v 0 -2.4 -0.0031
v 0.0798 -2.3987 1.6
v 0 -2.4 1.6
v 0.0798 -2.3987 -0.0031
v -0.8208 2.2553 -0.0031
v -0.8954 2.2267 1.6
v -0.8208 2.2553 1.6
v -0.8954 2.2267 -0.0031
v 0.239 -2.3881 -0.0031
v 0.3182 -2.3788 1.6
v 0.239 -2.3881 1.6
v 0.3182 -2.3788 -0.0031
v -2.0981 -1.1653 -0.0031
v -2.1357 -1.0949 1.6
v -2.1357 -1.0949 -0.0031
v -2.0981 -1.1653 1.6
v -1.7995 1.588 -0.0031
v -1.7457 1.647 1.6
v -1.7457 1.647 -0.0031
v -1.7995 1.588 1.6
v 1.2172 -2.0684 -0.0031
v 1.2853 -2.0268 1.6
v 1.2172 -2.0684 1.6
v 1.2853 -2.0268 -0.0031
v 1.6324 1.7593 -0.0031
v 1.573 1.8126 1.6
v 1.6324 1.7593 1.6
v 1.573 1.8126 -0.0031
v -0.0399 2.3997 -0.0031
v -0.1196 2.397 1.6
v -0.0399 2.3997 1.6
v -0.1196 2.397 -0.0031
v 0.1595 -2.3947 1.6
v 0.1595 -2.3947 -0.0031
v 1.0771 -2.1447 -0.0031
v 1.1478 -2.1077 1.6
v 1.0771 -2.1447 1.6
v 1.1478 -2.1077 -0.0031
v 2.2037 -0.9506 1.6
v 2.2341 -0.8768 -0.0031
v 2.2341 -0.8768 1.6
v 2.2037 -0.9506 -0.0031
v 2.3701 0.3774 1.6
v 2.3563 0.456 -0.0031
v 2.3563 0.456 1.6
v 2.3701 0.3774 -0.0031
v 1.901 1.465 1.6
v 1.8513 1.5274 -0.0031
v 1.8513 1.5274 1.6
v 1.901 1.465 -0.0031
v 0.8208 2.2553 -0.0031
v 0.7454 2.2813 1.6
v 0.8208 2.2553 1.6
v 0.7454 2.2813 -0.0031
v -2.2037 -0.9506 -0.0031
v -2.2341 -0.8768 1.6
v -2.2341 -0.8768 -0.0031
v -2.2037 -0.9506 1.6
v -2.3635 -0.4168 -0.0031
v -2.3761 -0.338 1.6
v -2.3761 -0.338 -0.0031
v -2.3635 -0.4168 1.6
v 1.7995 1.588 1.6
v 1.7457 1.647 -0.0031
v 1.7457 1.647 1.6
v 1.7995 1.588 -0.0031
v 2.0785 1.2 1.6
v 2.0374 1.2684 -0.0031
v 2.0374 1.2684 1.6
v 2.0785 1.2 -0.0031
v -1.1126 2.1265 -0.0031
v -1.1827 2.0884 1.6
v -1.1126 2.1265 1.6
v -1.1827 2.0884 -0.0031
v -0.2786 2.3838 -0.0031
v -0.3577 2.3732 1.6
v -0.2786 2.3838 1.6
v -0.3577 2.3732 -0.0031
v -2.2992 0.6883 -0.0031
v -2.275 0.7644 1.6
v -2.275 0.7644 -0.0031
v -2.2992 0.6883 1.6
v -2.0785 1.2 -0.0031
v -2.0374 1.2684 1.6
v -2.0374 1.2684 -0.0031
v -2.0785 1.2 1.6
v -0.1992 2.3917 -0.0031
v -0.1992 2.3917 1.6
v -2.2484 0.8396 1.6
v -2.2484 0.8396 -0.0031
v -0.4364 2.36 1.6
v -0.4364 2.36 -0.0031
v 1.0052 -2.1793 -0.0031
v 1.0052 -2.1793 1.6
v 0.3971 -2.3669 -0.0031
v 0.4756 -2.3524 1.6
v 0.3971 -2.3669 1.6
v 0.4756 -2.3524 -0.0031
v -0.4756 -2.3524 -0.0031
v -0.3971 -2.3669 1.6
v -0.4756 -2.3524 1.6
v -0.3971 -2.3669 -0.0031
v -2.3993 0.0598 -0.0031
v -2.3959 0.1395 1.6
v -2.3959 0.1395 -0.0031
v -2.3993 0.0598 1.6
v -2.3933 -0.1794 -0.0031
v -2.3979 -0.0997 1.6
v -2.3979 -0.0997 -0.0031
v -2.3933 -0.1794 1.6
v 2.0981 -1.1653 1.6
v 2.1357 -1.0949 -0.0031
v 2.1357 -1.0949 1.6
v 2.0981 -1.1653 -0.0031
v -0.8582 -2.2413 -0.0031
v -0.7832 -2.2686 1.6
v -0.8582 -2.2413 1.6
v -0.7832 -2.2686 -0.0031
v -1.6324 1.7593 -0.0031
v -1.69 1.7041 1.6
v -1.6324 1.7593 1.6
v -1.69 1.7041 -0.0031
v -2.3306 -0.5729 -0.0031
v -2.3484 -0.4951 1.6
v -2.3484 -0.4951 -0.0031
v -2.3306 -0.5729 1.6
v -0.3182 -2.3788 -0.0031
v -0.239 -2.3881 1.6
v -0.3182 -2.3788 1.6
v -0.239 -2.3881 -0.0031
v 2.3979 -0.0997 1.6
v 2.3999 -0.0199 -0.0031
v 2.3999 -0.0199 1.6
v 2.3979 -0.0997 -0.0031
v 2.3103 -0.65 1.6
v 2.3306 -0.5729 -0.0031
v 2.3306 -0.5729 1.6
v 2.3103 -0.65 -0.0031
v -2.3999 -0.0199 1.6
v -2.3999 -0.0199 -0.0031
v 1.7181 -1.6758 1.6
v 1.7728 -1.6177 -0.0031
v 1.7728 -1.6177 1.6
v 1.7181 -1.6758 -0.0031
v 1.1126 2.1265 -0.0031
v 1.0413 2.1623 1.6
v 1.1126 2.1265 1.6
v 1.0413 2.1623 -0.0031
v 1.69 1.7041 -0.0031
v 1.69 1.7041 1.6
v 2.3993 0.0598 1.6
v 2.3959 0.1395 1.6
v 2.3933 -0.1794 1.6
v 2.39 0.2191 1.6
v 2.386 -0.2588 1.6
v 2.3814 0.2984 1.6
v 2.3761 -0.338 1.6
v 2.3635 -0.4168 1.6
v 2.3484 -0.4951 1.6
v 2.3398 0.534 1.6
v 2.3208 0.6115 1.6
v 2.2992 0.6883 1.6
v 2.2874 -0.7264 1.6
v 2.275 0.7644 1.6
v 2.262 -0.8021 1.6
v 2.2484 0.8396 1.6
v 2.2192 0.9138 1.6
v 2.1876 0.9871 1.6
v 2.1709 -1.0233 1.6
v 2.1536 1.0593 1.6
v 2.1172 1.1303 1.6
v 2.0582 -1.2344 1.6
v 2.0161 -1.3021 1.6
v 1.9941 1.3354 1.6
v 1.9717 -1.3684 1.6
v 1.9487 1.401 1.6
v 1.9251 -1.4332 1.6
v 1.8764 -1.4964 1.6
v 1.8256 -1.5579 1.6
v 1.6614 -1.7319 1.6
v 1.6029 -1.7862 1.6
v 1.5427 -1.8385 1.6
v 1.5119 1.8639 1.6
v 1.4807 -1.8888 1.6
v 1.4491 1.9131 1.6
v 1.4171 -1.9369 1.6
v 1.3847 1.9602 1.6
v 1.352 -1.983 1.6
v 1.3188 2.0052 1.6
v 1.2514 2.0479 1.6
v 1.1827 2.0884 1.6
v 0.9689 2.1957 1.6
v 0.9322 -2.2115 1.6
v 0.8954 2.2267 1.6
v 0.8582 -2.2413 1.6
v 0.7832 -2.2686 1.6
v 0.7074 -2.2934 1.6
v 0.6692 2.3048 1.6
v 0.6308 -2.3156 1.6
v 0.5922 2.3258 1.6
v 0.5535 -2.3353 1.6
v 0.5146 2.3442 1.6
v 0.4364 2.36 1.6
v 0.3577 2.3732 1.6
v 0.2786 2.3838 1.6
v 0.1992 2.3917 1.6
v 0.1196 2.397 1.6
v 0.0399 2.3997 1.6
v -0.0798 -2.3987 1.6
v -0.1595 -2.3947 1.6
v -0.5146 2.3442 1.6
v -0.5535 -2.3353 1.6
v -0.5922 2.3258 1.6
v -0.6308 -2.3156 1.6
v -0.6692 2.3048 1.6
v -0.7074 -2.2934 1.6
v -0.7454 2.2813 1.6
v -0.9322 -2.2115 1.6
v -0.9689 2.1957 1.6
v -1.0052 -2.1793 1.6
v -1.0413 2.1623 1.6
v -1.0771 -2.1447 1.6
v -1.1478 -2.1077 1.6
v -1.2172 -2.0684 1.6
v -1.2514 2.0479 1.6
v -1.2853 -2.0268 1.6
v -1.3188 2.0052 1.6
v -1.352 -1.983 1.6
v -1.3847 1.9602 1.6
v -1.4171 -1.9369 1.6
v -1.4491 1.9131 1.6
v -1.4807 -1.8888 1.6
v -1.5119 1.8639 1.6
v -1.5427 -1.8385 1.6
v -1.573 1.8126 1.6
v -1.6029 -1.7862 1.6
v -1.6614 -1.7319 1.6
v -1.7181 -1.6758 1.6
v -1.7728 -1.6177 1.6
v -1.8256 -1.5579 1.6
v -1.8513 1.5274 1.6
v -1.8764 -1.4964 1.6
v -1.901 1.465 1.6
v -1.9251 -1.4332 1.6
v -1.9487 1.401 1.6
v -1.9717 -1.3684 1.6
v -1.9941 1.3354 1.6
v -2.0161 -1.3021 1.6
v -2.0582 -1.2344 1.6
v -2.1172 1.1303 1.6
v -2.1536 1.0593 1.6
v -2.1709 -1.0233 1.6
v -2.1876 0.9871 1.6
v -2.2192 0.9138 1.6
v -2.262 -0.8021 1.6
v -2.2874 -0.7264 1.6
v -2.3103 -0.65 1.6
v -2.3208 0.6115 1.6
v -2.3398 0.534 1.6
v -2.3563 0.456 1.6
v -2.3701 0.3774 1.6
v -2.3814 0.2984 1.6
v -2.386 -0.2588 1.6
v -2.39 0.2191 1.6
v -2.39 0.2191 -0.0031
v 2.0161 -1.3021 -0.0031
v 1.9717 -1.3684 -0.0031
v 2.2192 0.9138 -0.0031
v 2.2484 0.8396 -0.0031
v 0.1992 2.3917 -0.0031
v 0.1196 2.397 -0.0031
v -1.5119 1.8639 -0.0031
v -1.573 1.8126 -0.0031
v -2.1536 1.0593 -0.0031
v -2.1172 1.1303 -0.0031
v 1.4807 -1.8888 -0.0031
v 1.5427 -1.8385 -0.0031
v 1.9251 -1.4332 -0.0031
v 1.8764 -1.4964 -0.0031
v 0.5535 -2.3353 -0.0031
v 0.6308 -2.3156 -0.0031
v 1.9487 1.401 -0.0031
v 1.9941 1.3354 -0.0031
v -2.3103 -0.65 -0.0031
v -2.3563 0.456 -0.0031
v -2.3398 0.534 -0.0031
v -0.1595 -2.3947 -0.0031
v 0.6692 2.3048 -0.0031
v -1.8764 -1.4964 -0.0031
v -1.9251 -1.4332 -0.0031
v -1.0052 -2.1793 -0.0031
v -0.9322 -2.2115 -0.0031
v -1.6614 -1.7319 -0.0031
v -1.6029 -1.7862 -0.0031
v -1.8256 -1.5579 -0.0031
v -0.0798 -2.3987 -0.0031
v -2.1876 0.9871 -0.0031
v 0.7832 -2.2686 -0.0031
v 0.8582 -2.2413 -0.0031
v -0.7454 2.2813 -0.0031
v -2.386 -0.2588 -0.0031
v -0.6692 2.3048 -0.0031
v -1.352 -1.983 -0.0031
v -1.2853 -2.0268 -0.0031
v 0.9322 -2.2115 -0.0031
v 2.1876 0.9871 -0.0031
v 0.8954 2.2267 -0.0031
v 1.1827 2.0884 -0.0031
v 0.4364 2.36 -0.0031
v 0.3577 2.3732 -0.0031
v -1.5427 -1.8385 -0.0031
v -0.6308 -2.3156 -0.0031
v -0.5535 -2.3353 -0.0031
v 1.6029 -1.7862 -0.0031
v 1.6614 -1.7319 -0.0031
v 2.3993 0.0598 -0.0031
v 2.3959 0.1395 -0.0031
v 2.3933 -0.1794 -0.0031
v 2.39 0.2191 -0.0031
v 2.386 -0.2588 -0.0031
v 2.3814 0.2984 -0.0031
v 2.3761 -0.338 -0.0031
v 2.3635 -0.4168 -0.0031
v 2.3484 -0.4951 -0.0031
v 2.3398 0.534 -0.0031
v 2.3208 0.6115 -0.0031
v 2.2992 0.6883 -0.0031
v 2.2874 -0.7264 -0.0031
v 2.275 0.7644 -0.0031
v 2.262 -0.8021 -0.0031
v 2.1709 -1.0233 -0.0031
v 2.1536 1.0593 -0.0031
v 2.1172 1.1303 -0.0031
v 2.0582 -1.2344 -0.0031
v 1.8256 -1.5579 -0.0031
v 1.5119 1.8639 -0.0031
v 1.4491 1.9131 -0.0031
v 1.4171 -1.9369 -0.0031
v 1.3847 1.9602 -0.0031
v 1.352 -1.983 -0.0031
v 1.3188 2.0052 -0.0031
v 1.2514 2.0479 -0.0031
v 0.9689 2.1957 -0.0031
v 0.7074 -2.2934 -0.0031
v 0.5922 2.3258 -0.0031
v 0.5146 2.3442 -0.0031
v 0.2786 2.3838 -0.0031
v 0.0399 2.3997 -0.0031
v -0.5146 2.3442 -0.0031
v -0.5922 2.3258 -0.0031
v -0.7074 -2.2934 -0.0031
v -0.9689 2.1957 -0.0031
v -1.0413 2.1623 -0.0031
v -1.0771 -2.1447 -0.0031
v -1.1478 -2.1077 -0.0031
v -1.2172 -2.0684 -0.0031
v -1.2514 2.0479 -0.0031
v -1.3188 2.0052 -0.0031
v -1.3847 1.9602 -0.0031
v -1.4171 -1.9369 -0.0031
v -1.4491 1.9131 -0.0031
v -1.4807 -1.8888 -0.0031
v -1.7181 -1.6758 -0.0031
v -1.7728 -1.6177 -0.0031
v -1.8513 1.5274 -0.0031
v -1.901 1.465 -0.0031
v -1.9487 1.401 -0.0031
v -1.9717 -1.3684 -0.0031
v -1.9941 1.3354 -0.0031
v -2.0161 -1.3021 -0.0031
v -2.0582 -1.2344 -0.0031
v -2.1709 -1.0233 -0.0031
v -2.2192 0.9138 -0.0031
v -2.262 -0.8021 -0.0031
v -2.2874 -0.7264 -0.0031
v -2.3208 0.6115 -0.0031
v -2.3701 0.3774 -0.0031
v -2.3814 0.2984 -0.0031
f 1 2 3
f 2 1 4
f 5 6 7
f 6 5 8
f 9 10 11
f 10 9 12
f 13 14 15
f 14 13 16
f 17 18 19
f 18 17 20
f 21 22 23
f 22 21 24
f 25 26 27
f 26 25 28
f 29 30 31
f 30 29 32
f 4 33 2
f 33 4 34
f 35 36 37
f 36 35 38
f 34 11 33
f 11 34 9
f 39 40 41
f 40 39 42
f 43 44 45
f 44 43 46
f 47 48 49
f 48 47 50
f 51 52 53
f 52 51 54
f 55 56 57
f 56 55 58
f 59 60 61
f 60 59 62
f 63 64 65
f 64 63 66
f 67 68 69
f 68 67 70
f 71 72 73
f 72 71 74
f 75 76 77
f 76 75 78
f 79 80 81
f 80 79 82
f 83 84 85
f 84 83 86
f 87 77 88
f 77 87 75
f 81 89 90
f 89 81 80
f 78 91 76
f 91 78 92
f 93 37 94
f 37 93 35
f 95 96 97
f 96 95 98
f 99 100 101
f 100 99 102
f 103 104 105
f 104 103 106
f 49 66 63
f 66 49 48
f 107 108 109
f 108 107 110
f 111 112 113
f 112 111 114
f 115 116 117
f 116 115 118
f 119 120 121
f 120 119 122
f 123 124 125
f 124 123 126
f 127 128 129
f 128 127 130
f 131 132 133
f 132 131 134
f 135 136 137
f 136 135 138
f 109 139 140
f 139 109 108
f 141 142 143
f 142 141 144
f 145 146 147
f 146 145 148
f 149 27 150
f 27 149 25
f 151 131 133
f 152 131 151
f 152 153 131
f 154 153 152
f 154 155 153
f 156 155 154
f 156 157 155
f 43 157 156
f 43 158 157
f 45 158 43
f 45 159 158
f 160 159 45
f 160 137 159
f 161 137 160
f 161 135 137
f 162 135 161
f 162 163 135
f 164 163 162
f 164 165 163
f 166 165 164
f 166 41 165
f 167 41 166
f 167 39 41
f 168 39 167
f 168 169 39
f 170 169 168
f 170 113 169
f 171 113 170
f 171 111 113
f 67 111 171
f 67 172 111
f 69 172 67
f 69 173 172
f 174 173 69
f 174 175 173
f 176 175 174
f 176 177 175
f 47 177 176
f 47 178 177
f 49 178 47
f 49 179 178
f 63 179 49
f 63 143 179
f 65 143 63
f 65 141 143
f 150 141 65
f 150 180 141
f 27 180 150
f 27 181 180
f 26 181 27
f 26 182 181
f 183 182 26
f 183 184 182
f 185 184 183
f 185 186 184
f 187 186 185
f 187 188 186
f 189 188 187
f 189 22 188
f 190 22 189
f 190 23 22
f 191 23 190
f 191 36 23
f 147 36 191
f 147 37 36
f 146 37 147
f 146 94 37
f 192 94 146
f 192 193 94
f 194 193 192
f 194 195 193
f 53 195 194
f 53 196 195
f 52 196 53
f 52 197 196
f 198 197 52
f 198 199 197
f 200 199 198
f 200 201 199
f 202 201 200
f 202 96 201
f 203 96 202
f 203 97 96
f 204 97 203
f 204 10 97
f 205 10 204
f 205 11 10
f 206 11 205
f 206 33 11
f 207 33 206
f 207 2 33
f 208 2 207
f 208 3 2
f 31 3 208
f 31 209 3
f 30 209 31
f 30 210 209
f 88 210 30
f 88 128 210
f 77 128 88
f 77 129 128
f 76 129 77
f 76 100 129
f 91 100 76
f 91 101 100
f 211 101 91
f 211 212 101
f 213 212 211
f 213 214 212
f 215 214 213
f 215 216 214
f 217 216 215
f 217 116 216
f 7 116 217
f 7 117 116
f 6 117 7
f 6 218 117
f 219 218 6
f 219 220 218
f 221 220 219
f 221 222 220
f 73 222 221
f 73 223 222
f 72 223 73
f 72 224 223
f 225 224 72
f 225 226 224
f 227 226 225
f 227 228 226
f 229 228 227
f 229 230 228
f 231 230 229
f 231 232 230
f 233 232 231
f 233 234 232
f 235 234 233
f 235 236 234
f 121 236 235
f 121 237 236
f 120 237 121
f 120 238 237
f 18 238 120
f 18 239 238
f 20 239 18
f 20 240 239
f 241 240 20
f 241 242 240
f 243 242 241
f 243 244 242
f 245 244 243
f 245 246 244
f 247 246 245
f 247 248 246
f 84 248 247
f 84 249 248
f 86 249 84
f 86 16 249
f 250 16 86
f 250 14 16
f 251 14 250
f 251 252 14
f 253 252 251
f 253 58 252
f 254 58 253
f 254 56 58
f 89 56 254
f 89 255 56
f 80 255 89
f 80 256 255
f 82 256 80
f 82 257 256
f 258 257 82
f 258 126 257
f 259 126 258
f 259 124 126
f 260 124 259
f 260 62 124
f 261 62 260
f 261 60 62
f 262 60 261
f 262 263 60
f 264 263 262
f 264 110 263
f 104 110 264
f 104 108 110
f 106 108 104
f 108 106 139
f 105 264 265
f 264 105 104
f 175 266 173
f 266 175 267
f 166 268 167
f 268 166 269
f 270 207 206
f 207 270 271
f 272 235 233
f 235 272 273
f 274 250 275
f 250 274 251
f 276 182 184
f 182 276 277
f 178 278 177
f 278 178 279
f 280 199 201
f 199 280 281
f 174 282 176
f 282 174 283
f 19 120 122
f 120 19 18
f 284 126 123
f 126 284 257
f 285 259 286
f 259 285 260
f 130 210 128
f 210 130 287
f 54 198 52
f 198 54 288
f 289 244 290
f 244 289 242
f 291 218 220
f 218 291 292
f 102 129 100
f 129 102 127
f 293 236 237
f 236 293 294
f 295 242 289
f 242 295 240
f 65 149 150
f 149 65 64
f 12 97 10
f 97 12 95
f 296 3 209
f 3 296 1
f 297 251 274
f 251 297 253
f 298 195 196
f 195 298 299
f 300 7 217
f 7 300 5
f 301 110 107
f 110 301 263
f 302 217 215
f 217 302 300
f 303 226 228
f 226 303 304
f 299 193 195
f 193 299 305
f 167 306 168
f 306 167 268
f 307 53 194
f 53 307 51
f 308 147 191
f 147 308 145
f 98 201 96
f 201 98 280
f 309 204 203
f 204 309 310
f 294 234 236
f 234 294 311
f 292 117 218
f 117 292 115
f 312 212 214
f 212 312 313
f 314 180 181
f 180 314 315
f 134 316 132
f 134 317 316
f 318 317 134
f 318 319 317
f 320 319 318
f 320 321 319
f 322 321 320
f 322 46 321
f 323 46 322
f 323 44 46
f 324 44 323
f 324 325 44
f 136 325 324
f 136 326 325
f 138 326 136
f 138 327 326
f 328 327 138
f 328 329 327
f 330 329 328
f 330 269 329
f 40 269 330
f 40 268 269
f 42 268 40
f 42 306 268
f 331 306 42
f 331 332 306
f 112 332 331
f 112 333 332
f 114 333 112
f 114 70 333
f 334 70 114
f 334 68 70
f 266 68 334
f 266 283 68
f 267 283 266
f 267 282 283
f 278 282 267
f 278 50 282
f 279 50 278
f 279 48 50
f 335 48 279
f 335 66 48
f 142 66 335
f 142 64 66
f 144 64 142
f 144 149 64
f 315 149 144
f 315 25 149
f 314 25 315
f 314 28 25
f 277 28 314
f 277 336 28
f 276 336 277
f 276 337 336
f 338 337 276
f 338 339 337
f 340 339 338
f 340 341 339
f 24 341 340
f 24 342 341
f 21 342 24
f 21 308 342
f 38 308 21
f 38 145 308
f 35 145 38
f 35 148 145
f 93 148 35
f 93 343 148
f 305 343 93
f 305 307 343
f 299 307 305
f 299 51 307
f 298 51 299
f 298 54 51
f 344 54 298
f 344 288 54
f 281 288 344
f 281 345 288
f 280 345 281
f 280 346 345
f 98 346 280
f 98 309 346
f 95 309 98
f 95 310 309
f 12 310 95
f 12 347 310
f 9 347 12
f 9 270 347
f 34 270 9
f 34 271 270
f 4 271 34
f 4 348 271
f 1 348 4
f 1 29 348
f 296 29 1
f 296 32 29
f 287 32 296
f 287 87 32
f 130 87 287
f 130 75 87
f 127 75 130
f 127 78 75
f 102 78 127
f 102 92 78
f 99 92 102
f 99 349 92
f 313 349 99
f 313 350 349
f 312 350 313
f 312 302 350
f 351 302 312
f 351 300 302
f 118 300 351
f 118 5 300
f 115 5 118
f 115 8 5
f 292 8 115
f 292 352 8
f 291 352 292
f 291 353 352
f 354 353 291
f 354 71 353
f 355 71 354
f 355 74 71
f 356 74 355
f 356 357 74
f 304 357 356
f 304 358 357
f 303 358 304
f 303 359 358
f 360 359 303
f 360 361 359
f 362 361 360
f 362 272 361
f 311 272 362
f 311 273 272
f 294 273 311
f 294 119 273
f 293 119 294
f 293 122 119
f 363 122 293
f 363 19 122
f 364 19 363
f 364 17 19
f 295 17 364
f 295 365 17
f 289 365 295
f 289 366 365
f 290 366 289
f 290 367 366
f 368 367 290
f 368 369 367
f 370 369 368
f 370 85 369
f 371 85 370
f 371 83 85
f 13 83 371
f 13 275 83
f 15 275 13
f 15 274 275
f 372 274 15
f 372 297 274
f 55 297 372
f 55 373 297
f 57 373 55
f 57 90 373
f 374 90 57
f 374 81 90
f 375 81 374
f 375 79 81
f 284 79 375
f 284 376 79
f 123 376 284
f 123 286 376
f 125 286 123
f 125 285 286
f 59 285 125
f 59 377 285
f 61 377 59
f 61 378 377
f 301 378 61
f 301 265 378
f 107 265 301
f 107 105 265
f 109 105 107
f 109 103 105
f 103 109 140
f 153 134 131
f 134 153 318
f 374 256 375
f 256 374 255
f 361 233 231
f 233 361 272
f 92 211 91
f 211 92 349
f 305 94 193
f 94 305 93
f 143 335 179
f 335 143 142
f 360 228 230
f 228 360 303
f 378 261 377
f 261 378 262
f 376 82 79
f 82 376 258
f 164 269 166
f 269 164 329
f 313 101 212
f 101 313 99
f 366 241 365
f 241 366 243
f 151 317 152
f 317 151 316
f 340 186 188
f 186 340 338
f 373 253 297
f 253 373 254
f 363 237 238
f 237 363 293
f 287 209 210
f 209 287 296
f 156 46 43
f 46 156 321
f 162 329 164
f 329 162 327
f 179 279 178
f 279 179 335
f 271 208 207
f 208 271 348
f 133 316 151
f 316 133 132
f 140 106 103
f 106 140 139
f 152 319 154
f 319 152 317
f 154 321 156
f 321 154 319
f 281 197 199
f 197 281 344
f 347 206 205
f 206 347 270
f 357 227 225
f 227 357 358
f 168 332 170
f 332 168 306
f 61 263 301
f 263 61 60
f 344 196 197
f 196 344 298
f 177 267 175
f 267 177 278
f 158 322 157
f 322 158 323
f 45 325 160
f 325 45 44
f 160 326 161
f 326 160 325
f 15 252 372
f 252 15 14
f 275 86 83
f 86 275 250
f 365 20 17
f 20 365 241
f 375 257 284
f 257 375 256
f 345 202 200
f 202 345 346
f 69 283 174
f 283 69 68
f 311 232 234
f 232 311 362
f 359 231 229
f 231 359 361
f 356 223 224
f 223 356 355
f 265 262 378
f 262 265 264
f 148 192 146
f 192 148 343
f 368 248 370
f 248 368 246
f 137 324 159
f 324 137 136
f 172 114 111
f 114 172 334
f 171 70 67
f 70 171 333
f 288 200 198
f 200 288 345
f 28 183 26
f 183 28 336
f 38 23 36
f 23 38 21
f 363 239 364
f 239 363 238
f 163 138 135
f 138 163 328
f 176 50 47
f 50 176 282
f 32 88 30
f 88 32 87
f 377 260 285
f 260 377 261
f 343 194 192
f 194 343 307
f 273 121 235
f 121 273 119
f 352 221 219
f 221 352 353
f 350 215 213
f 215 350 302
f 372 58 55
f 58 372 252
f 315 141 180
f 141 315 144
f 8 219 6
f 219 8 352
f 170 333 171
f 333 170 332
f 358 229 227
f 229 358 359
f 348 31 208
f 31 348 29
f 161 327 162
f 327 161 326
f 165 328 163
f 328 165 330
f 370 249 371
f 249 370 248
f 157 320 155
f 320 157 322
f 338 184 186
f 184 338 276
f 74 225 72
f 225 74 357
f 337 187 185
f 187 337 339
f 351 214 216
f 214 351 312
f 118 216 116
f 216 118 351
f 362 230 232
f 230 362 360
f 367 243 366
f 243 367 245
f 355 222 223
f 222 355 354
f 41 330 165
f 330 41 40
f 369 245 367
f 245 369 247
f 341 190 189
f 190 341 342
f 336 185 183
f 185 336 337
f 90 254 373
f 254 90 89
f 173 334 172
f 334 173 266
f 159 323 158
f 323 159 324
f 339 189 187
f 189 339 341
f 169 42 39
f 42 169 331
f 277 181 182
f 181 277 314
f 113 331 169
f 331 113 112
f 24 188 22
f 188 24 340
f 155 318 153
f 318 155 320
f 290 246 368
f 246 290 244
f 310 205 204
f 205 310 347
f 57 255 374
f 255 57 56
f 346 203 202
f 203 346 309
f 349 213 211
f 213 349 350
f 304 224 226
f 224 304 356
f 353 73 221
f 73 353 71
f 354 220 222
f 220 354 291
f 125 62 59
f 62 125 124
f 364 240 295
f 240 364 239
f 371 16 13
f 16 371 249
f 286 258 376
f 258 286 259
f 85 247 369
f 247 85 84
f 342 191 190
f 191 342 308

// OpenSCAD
use <../lib.scad>
use <47899c01.scad>
$fa=1; $fs=0.2;
function ldraw_lib__4343c01(realsolid=false) = [
// 0 ~Moved to 47899c01
// 0 Name: 4343c01.dat
// 0 Author: [PTadmin]
// 0 !LDRAW_ORG Shortcut UPDATE 2019-03
// 0 !LICENSE Licensed under CC BY 4.0 : see CAreadme.txt
// 
// 0 BFC CERTIFY CCW
  [0,"BFC","CERTIFY"],
  [0,"BFC","CCW"],
// 
// 0 !HISTORY 2019-12-27 [PTadmin] Official Update 2019-03
// 
// 
// 0 // Door 1 x 4 x 5 Left with TransClear Glass
// 
// 1 16 0 0 0 1 0 0 0 1 0 0 0 1 47899c01.dat
  [1,16,0,0,0,1,0,0,0,1,0,0,0,1, ldraw_lib__47899c01(realsolid)],
];
module ldraw_lib__4343c01(step=0, col=false, unit=2/5, alt=false, line=0.2, solid=!$preview)
    makepoly(ldraw_lib__4343c01(solid), step=step, col=col, unit=unit, alt=alt, line=line, solid=solid);
ldraw_lib__4343c01(line=0.2);
